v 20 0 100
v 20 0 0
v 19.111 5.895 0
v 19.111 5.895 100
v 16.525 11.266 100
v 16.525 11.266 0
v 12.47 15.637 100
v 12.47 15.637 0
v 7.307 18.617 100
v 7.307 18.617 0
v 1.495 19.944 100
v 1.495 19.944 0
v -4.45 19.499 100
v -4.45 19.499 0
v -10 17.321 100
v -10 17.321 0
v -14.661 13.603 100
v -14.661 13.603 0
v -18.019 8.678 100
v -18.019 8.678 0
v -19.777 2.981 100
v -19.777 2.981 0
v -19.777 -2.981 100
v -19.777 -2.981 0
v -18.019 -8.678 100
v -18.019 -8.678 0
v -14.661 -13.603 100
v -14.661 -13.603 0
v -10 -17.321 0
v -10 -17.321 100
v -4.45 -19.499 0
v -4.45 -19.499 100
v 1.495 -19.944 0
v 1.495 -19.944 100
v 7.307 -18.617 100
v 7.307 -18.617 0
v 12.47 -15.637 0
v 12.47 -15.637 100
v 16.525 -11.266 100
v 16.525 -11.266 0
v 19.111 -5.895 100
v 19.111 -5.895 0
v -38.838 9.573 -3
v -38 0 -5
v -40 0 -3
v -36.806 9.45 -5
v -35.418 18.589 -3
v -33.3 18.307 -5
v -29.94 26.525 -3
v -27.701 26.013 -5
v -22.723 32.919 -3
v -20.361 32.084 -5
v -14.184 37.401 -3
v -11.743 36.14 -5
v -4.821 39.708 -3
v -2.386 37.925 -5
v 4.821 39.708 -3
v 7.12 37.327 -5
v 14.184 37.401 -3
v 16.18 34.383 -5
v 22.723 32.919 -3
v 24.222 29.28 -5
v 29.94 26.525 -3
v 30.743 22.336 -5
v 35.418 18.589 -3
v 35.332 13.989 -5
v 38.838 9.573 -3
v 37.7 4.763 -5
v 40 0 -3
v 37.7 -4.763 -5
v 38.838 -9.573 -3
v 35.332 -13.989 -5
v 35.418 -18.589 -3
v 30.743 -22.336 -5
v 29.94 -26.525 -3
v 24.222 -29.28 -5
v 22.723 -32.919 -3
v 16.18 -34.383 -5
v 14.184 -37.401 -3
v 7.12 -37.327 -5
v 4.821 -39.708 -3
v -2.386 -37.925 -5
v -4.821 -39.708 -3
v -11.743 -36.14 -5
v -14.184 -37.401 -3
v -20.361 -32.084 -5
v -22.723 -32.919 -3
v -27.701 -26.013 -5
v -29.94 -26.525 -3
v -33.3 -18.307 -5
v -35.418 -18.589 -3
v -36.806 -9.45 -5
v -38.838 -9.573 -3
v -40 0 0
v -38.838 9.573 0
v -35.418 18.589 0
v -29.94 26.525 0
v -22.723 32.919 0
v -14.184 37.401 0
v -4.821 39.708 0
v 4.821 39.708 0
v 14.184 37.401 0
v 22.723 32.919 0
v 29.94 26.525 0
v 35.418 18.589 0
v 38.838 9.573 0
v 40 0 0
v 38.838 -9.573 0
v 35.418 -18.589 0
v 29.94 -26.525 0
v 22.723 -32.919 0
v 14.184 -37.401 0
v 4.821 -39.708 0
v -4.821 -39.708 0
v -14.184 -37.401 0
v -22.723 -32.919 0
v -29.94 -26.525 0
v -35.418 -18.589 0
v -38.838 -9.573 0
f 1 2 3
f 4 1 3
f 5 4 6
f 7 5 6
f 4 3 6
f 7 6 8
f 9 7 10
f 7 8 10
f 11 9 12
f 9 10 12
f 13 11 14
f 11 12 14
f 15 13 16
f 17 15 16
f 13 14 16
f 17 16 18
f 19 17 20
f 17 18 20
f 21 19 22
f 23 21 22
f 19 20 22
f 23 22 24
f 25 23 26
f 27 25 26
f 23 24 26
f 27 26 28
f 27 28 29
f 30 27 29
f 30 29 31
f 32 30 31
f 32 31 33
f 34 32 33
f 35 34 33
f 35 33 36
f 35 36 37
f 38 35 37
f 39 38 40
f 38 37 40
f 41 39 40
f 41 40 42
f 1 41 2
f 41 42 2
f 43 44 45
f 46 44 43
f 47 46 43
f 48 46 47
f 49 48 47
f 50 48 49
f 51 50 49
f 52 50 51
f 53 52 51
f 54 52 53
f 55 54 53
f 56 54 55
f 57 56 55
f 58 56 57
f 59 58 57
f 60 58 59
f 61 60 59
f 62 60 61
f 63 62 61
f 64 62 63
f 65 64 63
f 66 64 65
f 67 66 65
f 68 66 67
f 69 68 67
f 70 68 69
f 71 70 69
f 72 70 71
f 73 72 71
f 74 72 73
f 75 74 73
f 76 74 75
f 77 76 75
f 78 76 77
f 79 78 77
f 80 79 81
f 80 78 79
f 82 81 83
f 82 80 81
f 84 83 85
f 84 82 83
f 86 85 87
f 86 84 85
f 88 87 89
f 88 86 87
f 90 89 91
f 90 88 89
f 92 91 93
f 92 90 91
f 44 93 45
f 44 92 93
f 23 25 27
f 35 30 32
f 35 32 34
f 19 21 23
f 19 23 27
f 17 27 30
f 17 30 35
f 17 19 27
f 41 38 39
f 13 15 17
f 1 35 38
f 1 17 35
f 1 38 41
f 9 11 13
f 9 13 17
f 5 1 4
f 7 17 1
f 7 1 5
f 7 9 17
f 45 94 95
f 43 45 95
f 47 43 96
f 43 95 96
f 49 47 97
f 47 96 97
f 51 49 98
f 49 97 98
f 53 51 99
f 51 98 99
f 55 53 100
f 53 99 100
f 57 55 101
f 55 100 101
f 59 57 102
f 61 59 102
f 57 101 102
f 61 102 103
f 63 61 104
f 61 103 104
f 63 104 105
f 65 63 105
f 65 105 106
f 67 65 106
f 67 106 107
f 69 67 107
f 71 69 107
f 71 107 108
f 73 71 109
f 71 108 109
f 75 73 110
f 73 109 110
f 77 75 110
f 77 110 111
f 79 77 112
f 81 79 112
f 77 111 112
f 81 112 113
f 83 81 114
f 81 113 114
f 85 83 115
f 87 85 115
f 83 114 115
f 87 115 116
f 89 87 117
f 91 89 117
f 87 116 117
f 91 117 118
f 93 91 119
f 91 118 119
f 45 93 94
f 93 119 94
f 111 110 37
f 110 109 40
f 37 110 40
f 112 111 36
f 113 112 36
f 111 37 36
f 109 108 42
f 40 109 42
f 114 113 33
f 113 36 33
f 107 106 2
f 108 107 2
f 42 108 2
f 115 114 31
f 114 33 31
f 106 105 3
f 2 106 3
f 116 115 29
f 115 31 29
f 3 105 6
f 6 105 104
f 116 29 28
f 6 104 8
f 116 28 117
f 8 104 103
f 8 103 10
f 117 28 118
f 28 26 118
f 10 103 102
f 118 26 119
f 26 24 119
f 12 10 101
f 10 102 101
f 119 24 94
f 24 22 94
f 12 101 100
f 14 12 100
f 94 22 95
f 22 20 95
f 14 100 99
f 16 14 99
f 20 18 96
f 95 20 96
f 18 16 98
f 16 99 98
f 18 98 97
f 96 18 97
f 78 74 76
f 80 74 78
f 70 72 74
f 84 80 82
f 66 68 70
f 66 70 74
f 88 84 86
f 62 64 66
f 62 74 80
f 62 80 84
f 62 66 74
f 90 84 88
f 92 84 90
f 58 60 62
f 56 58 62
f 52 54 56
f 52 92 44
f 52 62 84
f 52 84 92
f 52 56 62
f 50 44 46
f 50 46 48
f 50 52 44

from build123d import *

# Parameters (mm, degrees)
SKETCH2_R           = 20
BOSS_EXTRUDE1_DEPTH = 100
SKETCH3_R           = 40
BOSS_EXTRUDE2_DEPTH = 5
CHAMFER1_SIZE       = 2


with BuildPart() as part:
    # Sketch2 → Boss-Extrude1 (new body)
    with BuildSketch(Plane.XY):
        Circle(SKETCH2_R)
    extrude(amount=BOSS_EXTRUDE1_DEPTH)

    # Sketch3 → Boss-Extrude2 (add)
    with BuildSketch(Plane(origin=(0, 0, 0), x_dir=(-1, 0, 0), z_dir=(0, 0, -1))):
        Circle(SKETCH3_R)
    extrude(amount=BOSS_EXTRUDE2_DEPTH)

    # Chamfer1
    chamfer1_edges = [part.edges().sort_by_distance(p)[0] for p in [
        (40, 0, -5),
    ]]
    chamfer(chamfer1_edges, length=CHAMFER1_SIZE)


solid = part.part
